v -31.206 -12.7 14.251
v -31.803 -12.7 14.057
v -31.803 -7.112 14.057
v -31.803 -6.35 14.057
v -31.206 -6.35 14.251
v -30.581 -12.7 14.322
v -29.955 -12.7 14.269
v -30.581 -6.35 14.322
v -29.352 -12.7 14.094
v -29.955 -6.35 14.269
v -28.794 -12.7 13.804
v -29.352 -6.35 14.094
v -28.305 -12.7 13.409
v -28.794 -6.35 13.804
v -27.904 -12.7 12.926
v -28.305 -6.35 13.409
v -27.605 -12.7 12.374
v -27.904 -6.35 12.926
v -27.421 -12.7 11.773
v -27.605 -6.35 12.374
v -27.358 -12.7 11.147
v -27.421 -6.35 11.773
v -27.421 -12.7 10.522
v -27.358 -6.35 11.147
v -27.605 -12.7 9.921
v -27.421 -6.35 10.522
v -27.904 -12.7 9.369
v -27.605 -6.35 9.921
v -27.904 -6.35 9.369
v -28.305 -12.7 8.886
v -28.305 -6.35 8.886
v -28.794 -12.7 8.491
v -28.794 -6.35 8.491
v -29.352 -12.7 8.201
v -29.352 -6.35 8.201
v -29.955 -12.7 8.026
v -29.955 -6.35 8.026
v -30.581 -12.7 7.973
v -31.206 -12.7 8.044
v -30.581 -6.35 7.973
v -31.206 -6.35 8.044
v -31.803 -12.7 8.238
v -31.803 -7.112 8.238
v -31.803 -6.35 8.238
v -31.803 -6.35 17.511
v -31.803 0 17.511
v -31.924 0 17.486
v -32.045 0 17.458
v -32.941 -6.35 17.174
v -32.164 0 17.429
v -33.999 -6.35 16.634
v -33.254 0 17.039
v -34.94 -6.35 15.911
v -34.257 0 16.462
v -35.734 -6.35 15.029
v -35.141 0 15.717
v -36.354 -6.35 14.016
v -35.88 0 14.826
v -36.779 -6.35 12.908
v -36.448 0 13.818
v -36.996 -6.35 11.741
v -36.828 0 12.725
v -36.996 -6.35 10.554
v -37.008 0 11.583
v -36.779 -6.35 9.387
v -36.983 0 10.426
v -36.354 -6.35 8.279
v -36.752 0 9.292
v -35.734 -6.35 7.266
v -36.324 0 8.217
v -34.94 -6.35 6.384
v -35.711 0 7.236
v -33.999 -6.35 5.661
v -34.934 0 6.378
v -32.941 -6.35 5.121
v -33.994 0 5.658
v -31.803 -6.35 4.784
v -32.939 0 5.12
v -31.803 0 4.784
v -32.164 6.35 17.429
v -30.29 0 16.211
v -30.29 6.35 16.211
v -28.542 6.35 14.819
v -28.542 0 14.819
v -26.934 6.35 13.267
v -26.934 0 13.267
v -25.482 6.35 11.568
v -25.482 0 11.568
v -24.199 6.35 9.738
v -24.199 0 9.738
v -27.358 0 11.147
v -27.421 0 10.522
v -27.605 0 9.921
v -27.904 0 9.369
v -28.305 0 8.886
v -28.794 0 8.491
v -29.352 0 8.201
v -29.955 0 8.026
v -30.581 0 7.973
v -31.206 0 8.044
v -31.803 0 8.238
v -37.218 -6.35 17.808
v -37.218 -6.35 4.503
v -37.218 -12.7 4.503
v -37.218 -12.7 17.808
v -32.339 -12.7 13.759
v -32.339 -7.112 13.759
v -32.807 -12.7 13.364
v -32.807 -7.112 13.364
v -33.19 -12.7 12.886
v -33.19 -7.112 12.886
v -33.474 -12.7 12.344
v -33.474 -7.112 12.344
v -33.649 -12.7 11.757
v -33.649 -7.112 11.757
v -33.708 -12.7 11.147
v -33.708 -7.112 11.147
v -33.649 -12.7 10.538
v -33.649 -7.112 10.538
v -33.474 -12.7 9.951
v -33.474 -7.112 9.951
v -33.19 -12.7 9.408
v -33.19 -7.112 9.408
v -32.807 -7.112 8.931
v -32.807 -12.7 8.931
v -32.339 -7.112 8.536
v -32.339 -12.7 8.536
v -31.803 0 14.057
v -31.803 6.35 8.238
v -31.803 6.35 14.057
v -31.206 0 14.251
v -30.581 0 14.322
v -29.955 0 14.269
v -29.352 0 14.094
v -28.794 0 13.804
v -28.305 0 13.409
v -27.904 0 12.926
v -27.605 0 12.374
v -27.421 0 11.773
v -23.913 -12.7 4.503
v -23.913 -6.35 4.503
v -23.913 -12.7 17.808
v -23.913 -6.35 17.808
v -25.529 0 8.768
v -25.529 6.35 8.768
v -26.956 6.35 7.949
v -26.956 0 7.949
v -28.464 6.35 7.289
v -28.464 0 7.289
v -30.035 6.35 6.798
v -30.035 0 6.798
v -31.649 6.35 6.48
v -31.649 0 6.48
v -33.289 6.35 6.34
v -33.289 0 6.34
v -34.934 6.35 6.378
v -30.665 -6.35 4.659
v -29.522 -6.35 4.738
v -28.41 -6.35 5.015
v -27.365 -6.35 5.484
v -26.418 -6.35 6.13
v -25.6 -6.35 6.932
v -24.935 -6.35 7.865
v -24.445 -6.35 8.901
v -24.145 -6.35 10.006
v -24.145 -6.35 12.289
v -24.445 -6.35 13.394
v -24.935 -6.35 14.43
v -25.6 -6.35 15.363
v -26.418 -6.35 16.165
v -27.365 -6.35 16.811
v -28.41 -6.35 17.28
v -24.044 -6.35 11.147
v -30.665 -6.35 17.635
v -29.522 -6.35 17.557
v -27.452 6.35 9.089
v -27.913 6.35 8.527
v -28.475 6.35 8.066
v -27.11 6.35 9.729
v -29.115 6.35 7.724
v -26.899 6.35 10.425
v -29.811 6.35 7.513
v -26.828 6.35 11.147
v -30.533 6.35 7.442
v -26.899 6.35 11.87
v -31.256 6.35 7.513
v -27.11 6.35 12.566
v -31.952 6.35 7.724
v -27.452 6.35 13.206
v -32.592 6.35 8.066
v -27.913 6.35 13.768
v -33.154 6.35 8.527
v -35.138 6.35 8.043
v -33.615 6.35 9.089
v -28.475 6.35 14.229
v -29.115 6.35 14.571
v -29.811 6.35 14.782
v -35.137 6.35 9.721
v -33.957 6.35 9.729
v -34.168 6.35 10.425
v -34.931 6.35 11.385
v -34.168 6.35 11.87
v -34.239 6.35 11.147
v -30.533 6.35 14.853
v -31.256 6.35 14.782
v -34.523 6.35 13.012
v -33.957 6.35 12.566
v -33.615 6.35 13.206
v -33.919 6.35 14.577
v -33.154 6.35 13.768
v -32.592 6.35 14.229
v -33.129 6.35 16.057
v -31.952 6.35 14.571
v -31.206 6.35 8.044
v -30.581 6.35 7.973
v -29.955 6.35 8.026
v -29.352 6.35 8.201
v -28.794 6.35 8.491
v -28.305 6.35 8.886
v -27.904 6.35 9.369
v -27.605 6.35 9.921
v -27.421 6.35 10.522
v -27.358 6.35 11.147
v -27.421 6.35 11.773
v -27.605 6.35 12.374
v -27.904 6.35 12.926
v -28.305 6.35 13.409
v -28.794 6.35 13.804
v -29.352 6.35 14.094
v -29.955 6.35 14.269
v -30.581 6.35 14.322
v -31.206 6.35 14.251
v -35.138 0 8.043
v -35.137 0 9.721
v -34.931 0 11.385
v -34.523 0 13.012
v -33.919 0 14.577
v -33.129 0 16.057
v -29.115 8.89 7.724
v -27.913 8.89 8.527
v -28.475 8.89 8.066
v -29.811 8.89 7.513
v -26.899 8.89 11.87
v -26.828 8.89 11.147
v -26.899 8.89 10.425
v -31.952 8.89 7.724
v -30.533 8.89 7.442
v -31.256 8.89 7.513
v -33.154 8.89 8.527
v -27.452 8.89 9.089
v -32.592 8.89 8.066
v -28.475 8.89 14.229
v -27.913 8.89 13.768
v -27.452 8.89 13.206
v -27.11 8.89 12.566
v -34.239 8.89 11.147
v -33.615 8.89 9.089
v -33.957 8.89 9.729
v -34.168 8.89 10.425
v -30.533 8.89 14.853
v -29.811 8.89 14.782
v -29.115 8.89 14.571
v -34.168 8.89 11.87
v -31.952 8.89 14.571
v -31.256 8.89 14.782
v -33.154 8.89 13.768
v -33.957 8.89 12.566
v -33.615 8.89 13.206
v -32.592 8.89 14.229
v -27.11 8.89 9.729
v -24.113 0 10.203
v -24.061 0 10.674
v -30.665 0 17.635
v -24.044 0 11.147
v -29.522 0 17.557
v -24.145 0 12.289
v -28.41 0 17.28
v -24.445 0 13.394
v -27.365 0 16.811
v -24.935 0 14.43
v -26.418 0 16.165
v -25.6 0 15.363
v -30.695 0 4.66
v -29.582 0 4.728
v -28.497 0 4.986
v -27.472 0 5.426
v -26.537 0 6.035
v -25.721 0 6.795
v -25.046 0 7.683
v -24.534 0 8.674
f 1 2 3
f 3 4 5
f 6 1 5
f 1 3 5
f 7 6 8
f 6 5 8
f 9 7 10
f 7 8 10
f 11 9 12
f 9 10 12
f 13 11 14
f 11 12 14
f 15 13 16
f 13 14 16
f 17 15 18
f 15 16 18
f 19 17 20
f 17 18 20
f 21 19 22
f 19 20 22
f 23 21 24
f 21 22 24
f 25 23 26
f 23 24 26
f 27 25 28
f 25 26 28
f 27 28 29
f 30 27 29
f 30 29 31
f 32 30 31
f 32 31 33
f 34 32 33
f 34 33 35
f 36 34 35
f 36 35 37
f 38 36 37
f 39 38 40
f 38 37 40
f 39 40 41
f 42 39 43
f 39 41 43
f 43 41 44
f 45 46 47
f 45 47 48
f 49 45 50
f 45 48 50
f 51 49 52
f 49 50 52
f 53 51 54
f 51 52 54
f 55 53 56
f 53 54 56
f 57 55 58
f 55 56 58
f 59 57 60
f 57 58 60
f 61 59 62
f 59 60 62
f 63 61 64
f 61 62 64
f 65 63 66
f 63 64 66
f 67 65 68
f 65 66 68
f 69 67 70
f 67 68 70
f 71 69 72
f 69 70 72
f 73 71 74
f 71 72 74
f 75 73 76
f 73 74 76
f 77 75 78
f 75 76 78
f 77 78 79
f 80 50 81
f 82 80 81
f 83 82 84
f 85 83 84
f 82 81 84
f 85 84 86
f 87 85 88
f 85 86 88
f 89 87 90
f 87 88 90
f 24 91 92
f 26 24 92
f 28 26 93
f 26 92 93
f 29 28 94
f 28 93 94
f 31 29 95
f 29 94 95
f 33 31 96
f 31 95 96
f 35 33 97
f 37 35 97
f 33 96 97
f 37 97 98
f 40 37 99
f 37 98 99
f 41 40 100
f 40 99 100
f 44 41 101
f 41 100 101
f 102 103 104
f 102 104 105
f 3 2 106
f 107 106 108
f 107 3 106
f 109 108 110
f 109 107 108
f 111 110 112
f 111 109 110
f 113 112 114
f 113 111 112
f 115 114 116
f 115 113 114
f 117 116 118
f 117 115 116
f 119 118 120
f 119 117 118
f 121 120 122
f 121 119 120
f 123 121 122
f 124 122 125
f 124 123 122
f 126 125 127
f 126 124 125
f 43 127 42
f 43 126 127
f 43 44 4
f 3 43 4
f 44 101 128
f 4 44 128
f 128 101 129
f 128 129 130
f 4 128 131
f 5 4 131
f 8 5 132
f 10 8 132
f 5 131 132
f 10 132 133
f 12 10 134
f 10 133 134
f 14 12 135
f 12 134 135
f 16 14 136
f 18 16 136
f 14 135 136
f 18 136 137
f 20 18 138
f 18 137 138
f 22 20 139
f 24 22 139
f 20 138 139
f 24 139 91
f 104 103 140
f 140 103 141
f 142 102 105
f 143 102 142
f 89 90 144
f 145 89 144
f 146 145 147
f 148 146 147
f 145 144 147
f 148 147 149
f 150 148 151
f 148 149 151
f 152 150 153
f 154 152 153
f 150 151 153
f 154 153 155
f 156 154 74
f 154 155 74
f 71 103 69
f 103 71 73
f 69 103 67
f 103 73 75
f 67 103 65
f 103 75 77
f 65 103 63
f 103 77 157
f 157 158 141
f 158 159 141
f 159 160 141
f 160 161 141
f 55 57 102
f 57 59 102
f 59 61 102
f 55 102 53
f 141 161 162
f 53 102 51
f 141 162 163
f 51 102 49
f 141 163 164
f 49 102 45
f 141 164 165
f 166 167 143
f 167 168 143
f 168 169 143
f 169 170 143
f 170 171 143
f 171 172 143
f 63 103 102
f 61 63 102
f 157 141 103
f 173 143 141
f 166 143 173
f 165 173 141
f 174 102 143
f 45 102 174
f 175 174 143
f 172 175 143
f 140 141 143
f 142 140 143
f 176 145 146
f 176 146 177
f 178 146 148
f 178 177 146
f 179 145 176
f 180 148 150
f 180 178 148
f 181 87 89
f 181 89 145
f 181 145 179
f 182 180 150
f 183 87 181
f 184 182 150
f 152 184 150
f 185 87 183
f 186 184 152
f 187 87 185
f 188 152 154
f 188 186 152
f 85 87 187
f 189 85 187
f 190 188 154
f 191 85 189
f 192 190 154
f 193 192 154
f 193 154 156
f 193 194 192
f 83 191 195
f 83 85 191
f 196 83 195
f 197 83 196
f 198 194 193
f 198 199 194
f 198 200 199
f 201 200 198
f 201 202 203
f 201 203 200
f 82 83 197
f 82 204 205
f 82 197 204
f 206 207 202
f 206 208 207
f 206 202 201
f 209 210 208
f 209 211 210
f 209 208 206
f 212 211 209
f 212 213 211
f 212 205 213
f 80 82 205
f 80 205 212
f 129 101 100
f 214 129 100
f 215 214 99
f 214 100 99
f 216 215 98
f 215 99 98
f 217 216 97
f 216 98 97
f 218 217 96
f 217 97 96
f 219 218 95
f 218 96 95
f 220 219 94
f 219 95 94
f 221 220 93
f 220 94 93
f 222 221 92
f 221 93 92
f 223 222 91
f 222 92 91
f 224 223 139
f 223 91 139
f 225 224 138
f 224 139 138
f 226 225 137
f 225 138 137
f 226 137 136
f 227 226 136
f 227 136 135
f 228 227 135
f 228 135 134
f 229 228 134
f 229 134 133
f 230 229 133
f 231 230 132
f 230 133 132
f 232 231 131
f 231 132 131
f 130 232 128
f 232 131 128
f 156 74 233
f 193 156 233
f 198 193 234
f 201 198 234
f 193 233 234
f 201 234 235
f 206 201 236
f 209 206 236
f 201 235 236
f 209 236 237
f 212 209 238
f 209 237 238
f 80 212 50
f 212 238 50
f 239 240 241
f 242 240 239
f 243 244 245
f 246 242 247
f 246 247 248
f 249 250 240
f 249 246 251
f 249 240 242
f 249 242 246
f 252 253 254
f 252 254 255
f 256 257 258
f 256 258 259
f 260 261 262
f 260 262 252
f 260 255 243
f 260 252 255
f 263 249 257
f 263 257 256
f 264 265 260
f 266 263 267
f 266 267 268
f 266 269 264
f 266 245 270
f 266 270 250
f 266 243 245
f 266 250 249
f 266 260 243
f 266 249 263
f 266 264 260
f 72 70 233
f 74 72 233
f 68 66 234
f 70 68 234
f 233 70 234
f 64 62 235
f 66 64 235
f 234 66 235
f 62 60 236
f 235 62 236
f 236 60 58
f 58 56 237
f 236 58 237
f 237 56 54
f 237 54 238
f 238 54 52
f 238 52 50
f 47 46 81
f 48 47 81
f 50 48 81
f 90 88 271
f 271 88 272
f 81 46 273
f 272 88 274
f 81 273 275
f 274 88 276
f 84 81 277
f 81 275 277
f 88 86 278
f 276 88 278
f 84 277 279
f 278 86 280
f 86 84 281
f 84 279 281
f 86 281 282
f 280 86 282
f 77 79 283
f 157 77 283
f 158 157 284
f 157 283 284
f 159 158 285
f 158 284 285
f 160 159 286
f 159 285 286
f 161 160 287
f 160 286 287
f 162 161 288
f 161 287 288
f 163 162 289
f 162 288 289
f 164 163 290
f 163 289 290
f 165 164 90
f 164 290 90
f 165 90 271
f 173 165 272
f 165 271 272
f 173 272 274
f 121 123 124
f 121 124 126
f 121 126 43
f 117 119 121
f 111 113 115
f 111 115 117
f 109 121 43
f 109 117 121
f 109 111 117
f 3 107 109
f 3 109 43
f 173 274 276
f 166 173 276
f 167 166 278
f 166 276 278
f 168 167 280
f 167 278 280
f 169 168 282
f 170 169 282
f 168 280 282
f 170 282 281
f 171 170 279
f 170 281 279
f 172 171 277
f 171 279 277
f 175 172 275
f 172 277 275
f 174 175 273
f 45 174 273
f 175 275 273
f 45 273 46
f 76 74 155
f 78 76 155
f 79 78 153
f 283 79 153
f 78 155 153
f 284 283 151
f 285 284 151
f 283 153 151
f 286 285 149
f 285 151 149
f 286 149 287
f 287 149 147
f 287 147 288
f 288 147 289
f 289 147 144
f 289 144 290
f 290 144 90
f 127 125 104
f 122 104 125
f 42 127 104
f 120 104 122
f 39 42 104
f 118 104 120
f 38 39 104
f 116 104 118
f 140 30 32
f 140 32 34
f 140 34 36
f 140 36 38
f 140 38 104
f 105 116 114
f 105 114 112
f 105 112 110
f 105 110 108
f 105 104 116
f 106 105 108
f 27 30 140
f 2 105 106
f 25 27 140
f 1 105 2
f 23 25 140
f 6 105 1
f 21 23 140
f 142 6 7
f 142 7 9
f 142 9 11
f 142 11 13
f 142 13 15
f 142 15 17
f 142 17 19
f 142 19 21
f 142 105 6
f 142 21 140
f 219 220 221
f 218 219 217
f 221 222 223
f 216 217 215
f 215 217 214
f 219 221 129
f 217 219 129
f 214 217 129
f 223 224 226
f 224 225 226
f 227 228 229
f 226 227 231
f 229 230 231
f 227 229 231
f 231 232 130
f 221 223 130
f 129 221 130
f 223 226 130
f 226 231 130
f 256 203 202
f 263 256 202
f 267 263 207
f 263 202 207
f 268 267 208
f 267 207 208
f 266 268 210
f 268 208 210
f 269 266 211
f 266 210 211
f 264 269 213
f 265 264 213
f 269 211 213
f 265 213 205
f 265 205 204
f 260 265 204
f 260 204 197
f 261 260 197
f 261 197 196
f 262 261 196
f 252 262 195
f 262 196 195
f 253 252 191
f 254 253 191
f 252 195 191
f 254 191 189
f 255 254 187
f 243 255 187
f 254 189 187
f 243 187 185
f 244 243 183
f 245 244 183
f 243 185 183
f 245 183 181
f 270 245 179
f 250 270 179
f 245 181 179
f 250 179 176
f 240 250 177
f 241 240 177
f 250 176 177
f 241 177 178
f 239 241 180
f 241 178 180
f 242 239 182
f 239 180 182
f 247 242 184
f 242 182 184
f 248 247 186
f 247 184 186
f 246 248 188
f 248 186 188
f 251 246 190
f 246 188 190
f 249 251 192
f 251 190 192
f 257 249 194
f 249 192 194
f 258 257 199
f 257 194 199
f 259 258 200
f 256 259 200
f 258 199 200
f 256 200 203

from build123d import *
from build123d import SkipClean  # not in build123d's __all__

# Parameters (mm, degrees)
F1_DEPTH = 6.35
F2_W     = 13.3050326258
F2_H     = 13.3050344884
F2_R     = 6.4893385046
F3_DEPTH = 6.35
F4_DEPTH = 25.4
F5_DEPTH = 7.112
F7_DEPTH = 6.35
F8_R     = 3.7056239581
F9_DEPTH = 2.54


# Not quite as in the source:
# - after a boolean that leaves OpenCascade's solid faulty, fix() repairs it


with BuildPart() as f1:
    # F0 (on Front) → F1 (new body)
    with BuildSketch(Plane.XZ):
        with BuildLine():
            ThreePointArc((-31.8034514785, 8.237525334), (-33.7084514785, 11.1474609002), (-31.8034514785, 14.0573964665))
            Line((-31.8034514785, 14.0573964665), (-31.8034514785, 17.5113130534))
            ThreePointArc((-31.8034514785, 17.5113130534), (-37.0227899831, 11.1474609002), (-31.8034514785, 4.7836087471))
            Line((-31.8034514785, 4.7836087471), (-31.8034514785, 8.237525334))
        make_face()
        with BuildLine():
            Line((-31.8034514785, 8.237525334), (-31.8034514785, 14.0573964665))
            ThreePointArc((-31.8034514785, 14.0573964665), (-33.7084514785, 11.1474609002), (-31.8034514785, 8.237525334))
        make_face()
        with BuildLine():
            ThreePointArc((-31.8034514785, 14.0573964665), (-28.7944323584, 13.8038564845), (-27.3584514785, 11.1474609002))
            ThreePointArc((-27.3584514785, 11.1474609002), (-28.7944323584, 8.491065316), (-31.8034514785, 8.237525334))
            Line((-31.8034514785, 8.237525334), (-31.8034514785, 4.7836087471))
            ThreePointArc((-31.8034514785, 4.7836087471), (-26.4182325094, 6.129843232), (-24.0441129739, 11.1474609002))
            ThreePointArc((-24.0441129739, 11.1474609002), (-26.4182325094, 16.1650785684), (-31.8034514785, 17.5113130534))
            Line((-31.8034514785, 17.5113130534), (-31.8034514785, 14.0573964665))
        make_face()
    extrude(amount=F1_DEPTH)

    # F2 (on face) → F3 (join)
    with BuildSketch(Plane.XZ.offset(6.35)):
        with Locations((-30.5656185374, 11.1557710916)):
            Rectangle(F2_W, F2_H)
        with Locations((-30.5334514785, 11.1474609002)):
            Circle(F2_R, mode=Mode.SUBTRACT)
        with Locations((-30.5334514785, 11.1474609002)):
            Circle(F2_R)
        with BuildLine():
            ThreePointArc((-31.8034514785, 14.0573964665), (-27.3584514785, 11.1474609002), (-31.8034514785, 8.237525334))
            Line((-31.8034514785, 8.237525334), (-31.8034514785, 14.0573964665))
        make_face(mode=Mode.SUBTRACT)
    extrude(amount=F3_DEPTH)

    # F0 (on Front) → F4 (cut)
    with BuildSketch(Plane.XZ):
        with BuildLine():
            Line((-31.8034514785, 8.237525334), (-31.8034514785, 14.0573964665))
            ThreePointArc((-31.8034514785, 14.0573964665), (-33.7084514785, 11.1474609002), (-31.8034514785, 8.237525334))
        make_face()
    extrude(amount=F4_DEPTH, mode=Mode.SUBTRACT)

    # F0 (on Front) → F5 (join)
    with BuildSketch(Plane.XZ):
        with BuildLine():
            Line((-31.8034514785, 8.237525334), (-31.8034514785, 14.0573964665))
            ThreePointArc((-31.8034514785, 14.0573964665), (-33.7084514785, 11.1474609002), (-31.8034514785, 8.237525334))
        make_face()
    extrude(amount=F5_DEPTH)

    # F6 (on face) → F7 (join)
    with BuildSketch(Plane(origin=(0, 0, 0), x_dir=(-1, 0, 0), z_dir=(0, 1, 0))):
        with BuildLine():
            ThreePointArc((32.1643167645, 17.4285271033), (27.7190855009, 14.0622502303), (24.1990881726, 9.7377248483))
            ThreePointArc((24.1990881726, 9.7377248483), (29.2426072016, 7.0222894593), (34.9343685496, 6.3784522862))
            ThreePointArc((34.9343685496, 6.3784522862), (34.7517106144, 12.2049013649), (32.1643167645, 17.4285271033))
        make_face()
        with BuildLine():
            Line((31.8034514785, 14.0573964665), (31.8034514785, 8.237525334))
            ThreePointArc((31.8034514785, 8.237525334), (27.3584514785, 11.1474609002), (31.8034514785, 14.0573964665))
        make_face(mode=Mode.SUBTRACT)
    with SkipClean():  # cleaning this boolean's faces spoils the solid; the shape is the same uncleaned
        extrude(amount=F7_DEPTH)

    # F8 (on face) → F9 (join)
    with BuildSketch(Plane(origin=(0, 6.35, 0), x_dir=(-1, 0, 0), z_dir=(0, 1, 0))):
        with Locations((30.5334514785, 11.1474609002)):
            Circle(F8_R)
        with BuildLine():
            ThreePointArc((31.8034514785, 8.237525334), (27.3584514785, 11.1474609002), (31.8034514785, 14.0573964665))
            Line((31.8034514785, 14.0573964665), (31.8034514785, 8.237525334))
        make_face(mode=Mode.SUBTRACT)
        with BuildLine():
            Line((31.8034514785, 8.237525334), (31.8034514785, 14.0573964665))
            ThreePointArc((31.8034514785, 14.0573964665), (27.3584514785, 11.1474609002), (31.8034514785, 8.237525334))
        make_face()
    extrude(amount=F9_DEPTH)

    add(f1.part.fix(), mode=Mode.REPLACE)


solid = f1.part
